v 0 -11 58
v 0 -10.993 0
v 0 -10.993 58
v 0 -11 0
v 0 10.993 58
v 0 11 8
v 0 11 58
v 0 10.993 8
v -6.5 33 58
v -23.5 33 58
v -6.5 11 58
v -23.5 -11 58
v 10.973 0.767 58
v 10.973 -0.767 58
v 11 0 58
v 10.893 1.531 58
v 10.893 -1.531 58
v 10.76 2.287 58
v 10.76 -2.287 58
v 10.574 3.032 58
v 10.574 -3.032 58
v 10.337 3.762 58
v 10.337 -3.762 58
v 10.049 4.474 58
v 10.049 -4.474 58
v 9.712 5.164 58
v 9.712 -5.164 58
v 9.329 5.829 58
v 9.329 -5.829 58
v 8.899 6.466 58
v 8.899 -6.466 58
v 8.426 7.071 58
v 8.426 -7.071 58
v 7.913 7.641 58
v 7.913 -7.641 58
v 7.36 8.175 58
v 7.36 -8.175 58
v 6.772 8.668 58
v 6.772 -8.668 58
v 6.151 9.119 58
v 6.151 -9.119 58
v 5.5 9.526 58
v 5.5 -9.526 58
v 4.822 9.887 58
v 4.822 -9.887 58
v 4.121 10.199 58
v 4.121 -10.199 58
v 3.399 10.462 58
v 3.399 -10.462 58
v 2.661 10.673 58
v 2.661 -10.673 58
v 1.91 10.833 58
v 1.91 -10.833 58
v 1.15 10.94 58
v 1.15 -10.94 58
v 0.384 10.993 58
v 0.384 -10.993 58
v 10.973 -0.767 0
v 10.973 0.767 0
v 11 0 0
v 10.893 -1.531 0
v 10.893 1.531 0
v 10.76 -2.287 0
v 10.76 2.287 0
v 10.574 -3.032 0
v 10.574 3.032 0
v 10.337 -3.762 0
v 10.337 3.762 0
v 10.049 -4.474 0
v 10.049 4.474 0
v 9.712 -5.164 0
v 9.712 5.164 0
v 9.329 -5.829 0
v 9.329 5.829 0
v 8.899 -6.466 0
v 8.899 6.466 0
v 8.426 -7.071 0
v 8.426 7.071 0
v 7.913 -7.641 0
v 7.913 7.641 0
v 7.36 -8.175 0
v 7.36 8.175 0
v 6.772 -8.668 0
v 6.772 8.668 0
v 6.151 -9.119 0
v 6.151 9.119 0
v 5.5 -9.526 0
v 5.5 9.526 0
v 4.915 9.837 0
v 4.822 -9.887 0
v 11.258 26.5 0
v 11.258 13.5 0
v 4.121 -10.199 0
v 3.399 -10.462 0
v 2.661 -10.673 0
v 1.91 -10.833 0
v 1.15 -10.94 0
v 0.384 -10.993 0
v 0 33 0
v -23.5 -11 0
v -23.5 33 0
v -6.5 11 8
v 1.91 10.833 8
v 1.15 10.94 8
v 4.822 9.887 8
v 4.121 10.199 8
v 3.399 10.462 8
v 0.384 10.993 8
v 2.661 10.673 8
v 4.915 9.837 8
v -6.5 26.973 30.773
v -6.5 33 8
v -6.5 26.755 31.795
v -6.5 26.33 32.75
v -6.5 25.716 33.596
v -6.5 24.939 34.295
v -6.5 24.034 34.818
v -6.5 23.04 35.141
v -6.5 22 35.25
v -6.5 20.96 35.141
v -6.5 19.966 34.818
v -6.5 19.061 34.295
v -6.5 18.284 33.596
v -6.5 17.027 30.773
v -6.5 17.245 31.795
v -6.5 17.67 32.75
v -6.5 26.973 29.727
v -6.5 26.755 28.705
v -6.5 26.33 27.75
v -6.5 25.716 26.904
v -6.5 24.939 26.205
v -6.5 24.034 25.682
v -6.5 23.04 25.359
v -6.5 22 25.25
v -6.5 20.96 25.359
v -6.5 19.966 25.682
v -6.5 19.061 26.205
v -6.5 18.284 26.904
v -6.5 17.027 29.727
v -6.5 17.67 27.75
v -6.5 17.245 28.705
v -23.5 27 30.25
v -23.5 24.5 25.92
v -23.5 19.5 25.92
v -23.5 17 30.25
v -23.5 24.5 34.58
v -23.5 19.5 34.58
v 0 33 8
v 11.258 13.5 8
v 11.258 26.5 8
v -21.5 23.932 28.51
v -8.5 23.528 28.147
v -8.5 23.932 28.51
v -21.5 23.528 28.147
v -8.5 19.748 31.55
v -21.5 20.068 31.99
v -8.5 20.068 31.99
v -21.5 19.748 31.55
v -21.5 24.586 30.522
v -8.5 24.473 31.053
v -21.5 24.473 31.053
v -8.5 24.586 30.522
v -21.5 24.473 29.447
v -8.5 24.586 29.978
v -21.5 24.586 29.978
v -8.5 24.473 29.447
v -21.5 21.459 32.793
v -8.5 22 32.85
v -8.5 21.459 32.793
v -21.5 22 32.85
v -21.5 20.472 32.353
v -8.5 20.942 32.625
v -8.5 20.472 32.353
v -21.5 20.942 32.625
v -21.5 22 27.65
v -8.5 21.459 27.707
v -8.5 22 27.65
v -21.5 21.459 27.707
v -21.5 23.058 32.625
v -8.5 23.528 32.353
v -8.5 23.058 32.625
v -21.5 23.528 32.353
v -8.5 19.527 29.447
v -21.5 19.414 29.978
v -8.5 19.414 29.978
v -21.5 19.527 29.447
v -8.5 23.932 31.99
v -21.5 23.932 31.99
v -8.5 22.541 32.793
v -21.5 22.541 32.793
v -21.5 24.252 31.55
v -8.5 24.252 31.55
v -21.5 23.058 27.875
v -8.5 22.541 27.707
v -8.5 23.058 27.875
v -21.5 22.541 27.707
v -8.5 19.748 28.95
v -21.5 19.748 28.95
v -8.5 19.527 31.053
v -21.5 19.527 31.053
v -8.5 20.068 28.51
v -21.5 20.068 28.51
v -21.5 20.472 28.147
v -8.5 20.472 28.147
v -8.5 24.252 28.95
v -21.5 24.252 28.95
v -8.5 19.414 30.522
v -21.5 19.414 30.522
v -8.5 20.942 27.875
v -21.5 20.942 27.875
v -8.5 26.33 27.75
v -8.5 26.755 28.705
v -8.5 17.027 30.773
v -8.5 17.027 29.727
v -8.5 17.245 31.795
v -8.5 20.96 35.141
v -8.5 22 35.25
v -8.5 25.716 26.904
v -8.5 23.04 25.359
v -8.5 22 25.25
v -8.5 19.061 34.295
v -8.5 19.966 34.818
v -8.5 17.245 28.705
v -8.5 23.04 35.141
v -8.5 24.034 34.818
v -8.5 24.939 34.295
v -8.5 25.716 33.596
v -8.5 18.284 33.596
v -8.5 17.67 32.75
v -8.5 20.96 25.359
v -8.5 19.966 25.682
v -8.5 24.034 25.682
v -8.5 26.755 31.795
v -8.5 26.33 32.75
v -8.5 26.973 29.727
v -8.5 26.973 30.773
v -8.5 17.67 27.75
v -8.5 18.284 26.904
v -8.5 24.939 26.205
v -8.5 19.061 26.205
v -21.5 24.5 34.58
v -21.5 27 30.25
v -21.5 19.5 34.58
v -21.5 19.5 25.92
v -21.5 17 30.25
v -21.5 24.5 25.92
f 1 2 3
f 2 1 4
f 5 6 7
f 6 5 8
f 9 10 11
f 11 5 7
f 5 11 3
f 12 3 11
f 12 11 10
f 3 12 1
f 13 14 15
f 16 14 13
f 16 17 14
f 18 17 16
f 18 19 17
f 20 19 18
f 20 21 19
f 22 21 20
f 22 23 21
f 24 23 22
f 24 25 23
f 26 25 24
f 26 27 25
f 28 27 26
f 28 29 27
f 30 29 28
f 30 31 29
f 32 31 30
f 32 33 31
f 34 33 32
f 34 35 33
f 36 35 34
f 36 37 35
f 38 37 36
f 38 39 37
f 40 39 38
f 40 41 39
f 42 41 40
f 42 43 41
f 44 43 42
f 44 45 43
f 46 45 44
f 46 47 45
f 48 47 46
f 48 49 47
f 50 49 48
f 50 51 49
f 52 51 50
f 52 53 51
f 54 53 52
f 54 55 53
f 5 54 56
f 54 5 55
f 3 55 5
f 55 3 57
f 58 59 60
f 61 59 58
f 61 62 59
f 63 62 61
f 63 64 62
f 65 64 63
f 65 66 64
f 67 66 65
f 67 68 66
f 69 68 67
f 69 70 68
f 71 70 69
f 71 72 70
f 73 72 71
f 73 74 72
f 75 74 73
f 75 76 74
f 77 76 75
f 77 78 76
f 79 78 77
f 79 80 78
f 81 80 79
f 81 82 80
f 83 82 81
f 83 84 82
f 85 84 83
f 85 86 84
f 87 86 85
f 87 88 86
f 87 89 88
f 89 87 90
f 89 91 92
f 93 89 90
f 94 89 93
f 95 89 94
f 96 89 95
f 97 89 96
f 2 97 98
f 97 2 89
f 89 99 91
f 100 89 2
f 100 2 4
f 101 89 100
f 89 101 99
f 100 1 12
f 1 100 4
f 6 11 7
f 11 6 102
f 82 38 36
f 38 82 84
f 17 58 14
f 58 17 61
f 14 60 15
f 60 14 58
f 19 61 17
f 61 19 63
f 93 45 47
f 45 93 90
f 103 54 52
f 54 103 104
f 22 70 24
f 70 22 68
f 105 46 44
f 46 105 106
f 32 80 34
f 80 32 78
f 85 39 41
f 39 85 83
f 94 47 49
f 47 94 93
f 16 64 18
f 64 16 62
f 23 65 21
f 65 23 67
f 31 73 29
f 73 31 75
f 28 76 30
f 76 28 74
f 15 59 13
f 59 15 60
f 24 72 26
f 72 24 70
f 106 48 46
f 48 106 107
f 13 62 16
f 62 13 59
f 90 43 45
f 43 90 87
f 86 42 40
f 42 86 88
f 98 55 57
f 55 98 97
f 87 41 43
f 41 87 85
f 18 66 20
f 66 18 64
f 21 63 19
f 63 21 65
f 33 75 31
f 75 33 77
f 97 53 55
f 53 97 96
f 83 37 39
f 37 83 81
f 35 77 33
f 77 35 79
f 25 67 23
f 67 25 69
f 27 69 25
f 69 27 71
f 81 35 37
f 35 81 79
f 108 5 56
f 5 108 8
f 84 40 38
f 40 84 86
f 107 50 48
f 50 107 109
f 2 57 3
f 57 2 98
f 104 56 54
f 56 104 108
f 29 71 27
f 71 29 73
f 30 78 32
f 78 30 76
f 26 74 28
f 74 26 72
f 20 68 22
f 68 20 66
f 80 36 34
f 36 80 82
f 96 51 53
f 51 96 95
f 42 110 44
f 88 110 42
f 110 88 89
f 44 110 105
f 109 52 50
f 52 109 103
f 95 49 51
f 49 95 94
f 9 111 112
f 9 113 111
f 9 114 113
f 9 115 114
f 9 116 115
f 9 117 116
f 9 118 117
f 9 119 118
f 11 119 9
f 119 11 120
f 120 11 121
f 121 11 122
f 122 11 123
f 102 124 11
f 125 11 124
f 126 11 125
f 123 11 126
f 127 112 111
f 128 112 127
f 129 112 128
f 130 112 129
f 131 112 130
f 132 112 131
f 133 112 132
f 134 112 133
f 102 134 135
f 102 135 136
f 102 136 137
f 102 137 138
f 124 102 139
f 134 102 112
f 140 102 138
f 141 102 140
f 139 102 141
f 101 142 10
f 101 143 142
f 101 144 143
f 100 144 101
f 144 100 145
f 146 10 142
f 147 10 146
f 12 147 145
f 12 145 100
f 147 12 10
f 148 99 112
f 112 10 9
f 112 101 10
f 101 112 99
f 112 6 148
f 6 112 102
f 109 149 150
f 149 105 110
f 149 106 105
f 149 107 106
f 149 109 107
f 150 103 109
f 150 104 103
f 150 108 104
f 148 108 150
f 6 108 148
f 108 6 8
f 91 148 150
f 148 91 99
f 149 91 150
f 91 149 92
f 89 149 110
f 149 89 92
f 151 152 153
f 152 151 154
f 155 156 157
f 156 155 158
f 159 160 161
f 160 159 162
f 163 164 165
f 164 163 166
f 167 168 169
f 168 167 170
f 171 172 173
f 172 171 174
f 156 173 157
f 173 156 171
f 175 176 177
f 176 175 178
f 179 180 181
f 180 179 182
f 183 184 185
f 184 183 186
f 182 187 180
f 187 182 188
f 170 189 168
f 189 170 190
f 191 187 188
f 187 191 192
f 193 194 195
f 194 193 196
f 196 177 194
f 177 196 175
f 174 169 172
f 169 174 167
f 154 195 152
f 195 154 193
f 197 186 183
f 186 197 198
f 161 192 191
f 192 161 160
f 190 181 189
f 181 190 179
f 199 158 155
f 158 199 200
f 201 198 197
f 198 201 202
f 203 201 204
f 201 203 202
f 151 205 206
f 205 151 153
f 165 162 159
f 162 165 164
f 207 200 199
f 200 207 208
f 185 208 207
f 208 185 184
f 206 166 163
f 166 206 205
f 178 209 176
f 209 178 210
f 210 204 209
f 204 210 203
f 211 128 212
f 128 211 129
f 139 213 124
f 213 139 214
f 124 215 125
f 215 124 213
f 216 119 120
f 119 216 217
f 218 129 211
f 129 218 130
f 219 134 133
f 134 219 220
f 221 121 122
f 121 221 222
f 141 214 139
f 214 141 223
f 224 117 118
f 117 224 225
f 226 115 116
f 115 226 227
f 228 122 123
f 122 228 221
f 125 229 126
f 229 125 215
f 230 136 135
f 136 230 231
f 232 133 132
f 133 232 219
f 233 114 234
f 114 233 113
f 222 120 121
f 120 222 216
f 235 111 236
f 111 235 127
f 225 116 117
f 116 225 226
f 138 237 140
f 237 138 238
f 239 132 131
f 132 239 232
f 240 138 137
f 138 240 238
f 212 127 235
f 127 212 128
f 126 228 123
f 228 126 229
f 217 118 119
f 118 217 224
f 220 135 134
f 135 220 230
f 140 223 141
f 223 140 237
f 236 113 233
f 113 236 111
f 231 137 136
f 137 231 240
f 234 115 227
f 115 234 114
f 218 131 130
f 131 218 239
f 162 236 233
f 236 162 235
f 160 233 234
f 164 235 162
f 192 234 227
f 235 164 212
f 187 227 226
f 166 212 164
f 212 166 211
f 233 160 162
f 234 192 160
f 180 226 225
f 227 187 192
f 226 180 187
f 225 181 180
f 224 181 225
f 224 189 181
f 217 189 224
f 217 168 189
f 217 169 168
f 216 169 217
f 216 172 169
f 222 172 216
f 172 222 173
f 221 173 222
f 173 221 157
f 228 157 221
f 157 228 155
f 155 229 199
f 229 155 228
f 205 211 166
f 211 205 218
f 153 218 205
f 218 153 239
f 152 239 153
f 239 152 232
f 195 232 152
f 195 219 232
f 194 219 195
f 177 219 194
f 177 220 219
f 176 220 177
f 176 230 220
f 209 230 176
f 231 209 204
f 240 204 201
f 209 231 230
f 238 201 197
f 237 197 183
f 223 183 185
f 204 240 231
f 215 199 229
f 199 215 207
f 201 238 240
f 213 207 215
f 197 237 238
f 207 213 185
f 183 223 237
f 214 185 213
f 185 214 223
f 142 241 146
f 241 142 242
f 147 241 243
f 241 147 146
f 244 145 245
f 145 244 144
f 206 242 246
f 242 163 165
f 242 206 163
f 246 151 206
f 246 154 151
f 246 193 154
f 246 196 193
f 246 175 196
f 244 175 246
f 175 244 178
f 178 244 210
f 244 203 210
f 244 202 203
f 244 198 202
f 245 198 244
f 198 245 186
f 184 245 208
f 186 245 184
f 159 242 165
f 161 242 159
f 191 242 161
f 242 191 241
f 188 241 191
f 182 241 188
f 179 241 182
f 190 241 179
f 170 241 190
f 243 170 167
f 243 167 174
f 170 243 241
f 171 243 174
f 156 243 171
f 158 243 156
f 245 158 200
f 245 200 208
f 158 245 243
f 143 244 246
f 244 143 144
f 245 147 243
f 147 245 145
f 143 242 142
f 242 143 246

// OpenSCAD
// file: inc/bearing.scad
// PRUSA iteration3
// Bearing holders
// GNU GPL v3
// Josef Průša <iam@josefprusa.cz> and contributors
// http://www.reprap.org/wiki/Prusa_Mendel
// http://prusamendel.org

bearing_diameter = 16;

module horizontal_bearing_base(bearings=1){
 translate(v=[0,0,6]) cube(size = [24,8+bearings*25,12], center = true);	
}
module horizontal_bearing_holes(bearings=1){
 cutter_lenght = 10+bearings*25;
 one_holder_lenght = 8+25;
 holder_lenght = 8+bearings*25;
 
 // Main bearing cut
 difference(){
  translate(v=[0,0,12]) rotate(a=[90,0,0]) translate(v=[0,0,-cutter_lenght/2]) cylinder(h = cutter_lenght, r=bearing_diameter/2, $fn=50);
  // Bearing retainers
  translate(v=[0,1-holder_lenght/2,3]) cube(size = [24,6,8], center = true);
  translate(v=[0,-1+holder_lenght/2,3]) cube(size = [24,6,8], center = true);
 }
 
 // Ziptie cutouts
 ziptie_cut_ofset = 0;
 for ( i = [0 : bearings-1] ){
  // For easier positioning I move them by half of one 
  // bearing holder then add each bearign lenght and then center again
  translate(v=[0,-holder_lenght/2,0]) translate(v=[0,one_holder_lenght/2+i*25,0]) difference(){
   union(){
    translate(v=[0,2-6,12]) rotate(a=[90,0,0]) translate(v=[0,0,0]) cylinder(h = 4, r=12.5, $fn=50);
    translate(v=[0,2+6,12]) rotate(a=[90,0,0]) translate(v=[0,0,0]) cylinder(h = 4, r=12.5, $fn=50);
   }
   translate(v=[0,10,12]) rotate(a=[90,0,0]) translate(v=[0,0,0]) cylinder(h = 24, r=10, $fn=50);
  }
 }
 
}

module horizontal_bearing_test(){
 difference(){
  horizontal_bearing_base(1);
  horizontal_bearing_holes(1);
 }
 translate(v=[30,0,0]) difference(){
  horizontal_bearing_base(2);
  horizontal_bearing_holes(2);
 }
 translate(v=[60,0,0]) difference(){
  horizontal_bearing_base(3);
  horizontal_bearing_holes(3);
 }
}



thinwall = 3;
bearing_size = bearing_diameter + 2 * thinwall;

module vertical_bearing_base(){
 translate(v=[-2-bearing_size/4,0,29]) cube(size = [4+bearing_size/2,bearing_size,58], center = true);
 cylinder(h = 58, r=bearing_size/2, $fn = 90);
}

module vertical_bearing_holes(){
  translate(v=[0,0,-1]) cylinder(h = 62, r=bearing_diameter/2, $fn = 60);
  rotate(a=[0,0,-50]) translate(v=[8,0,31.5]) cube(size = [7,1,62], center = true);
}

difference(){
vertical_bearing_base();
vertical_bearing_holes();
}
// file: inc/x-end.scad
// PRUSA iteration3
// X end prototype
// GNU GPL v3
// Josef Průša <iam@josefprusa.cz> and contributors
// http://www.reprap.org/wiki/Prusa_Mendel
// http://prusamendel.org

use <bearing.scad>
rod_distance = 45;

module x_end_base(){
// Main block
height = 58;
translate(v=[-15,-11,height/2]) cube(size = [17,44,height], center = true);
// Bearing holder
 vertical_bearing_base();	
//Nut trap
 // Cube
 translate(v=[-2-2,-20,4]) cube(size = [8,26,8], center = true);
 // Hexagon
 translate(v=[0,-20,0]) rotate([0,0,30]) cylinder(h = 8, r=13, $fn = 6);
}

module x_end_holes(){
 vertical_bearing_holes();
// Belt hole
translate(v=[-1,0,0]){
// Stress relief
translate(v=[-5.5-10+1.5,-10-1,30]) cube(size = [20,1,28], center = true);
difference(){
	translate(v=[-5.5-10+1.5,-10,30]) cube(size = [10,46,28], center = true);

	

	// Nice edges
	translate(v=[-5.5-10+1.5,-10,30+23]) rotate([0,45,0]) cube(size = [10,46,28], center = true);
	translate(v=[-5.5-10+1.5,-10,30+23]) rotate([0,-45,0]) cube(size = [10,46,28], center = true);
	translate(v=[-5.5-10+1.5,-10,30-23]) rotate([0,45,0]) cube(size = [10,46,28], center = true);
	translate(v=[-5.5-10+1.5,-10,30-23]) rotate([0,-45,0]) cube(size = [10,46,28], center = true);

}
}

// Bottom pushfit rod
translate(v=[-15,-22.5-10.5-0.01,6]) rotate(a=[-90,0,0]) pushfit_rod(8.1,44.02);

// With crack
translate(v=[-15-0.3,-22.5-10.5-0.01,6-10]) cube([0.6,44.02,10]);

// Top pushfit rod
translate(v=[-15,-22.5-10.5-0.01,rod_distance+6]) rotate(a=[-90,0,0]) pushfit_rod(8.1,44.02);

// With crack
translate(v=[-15-0.3,-22.5-10.5-0.01,rod_distance+6]) cube([0.6,44.02,10]);


// Nut trap
// translate(v=[0,-20,-0.5]) cylinder(h = 4, r1=3.3, r2=2.8, $fn=25);
// translate(v=[0,-20,3]) rotate([0,0,30]) cylinder(h = 10, r=4.5, $fn = 6);

  translate([0,-20,-0.5]) cylinder(h=9,r=5.86,$fn=30);
  translate([0+8/sqrt(2),-20+8/sqrt(2),-0.5]) cylinder(h=9,r=1.88,$fn=30);
  translate([0+8/sqrt(2),-20-8/sqrt(2),-0.5]) cylinder(h=9,r=1.88,$fn=30);
  translate([0-8/sqrt(2),-20+8/sqrt(2),-0.5]) cylinder(h=9,r=1.88,$fn=30);
  translate([0-8/sqrt(2),-20-8/sqrt(2),-0.5]) cylinder(h=9,r=1.88,$fn=30);

// Installation space
  translate([0-8/sqrt(2),-20+8/sqrt(2),8]) cylinder(h=9,r1=3.5,r2=1.5,$fn=30);
  translate([0-8/sqrt(2),-20-8/sqrt(2),8]) cylinder(h=9,r1=3.5,r2=1.5,$fn=30);
  translate([0-8/sqrt(2),-20,8+4.5]) cube([3,16/sqrt(2),9],center=true);
}


// Final prototype
module x_end_plain(){
 difference(){
  x_end_base();
  x_end_holes();
 }
}

x_end_plain();


module pushfit_rod(diameter,length){
 cylinder(h = length, r=diameter/2, $fn=30);
 difference(){
 	translate(v=[0,-diameter/2.85,length/2]) rotate([0,0,45]) cube(size = [diameter/2,diameter/2,length], center = true);
 	translate(v=[0,-diameter/4-diameter/2-0.4,length/2]) rotate([0,0,0]) cube(size = [diameter,diameter/2,length], center = true);
 }
 //translate(v=[0,-diameter/2-2,length/2]) cube(size = [diameter,1,length], center = true);
}
// main file
// PRUSA iteration3
// X end idler
// GNU GPL v3
// Josef Průša <iam@josefprusa.cz> and contributors
// http://www.reprap.org/wiki/Prusa_Mendel
// http://prusamendel.org

use <inc/x-end.scad>

module x_end_idler_base(){
 x_end_base();
}

module x_end_idler_holes(){
 //x_end_holes();
// translate(v=[0,-22,30.25]) rotate(a=[0,-90,0]) cylinder(h = 80, r=1.8, $fn=30);
// translate(v=[1.5,-22,30.25]) rotate(a=[0,-90,0]) cylinder(h = 10, r=3.1, $fn=30);
// translate(v=[-21.5,-22,30.25]) rotate(a=[0,-90,0]) rotate(a=[0,0,30]) cylinder(h = 80, r=3.6, $fn=6);

//  translate([0,-22,30.25]) rotate([0,-90,0]) cylinder(h=80,r=2.9,$fn=30);


 translate(v=[0,-22,30.25]) rotate(a=[0,-90,0]) cylinder(h = 80, r=2.6, $fn=30);
 translate(v=[1.5,-22,30.25]) rotate(a=[0,-90,0]) cylinder(h = 10, r=5.0, $fn=30);
 translate(v=[-21.5,-22,30.25]) rotate(a=[0,-90,0]) rotate(a=[0,0,30]) cylinder(h = 80, r=5.0, $fn=6);
}
 
// Final part
module x_end_idler(){
 mirror([0,1,0]) difference(){
  x_end_idler_base();
  x_end_idler_holes();
 }
}

x_end_idler();
